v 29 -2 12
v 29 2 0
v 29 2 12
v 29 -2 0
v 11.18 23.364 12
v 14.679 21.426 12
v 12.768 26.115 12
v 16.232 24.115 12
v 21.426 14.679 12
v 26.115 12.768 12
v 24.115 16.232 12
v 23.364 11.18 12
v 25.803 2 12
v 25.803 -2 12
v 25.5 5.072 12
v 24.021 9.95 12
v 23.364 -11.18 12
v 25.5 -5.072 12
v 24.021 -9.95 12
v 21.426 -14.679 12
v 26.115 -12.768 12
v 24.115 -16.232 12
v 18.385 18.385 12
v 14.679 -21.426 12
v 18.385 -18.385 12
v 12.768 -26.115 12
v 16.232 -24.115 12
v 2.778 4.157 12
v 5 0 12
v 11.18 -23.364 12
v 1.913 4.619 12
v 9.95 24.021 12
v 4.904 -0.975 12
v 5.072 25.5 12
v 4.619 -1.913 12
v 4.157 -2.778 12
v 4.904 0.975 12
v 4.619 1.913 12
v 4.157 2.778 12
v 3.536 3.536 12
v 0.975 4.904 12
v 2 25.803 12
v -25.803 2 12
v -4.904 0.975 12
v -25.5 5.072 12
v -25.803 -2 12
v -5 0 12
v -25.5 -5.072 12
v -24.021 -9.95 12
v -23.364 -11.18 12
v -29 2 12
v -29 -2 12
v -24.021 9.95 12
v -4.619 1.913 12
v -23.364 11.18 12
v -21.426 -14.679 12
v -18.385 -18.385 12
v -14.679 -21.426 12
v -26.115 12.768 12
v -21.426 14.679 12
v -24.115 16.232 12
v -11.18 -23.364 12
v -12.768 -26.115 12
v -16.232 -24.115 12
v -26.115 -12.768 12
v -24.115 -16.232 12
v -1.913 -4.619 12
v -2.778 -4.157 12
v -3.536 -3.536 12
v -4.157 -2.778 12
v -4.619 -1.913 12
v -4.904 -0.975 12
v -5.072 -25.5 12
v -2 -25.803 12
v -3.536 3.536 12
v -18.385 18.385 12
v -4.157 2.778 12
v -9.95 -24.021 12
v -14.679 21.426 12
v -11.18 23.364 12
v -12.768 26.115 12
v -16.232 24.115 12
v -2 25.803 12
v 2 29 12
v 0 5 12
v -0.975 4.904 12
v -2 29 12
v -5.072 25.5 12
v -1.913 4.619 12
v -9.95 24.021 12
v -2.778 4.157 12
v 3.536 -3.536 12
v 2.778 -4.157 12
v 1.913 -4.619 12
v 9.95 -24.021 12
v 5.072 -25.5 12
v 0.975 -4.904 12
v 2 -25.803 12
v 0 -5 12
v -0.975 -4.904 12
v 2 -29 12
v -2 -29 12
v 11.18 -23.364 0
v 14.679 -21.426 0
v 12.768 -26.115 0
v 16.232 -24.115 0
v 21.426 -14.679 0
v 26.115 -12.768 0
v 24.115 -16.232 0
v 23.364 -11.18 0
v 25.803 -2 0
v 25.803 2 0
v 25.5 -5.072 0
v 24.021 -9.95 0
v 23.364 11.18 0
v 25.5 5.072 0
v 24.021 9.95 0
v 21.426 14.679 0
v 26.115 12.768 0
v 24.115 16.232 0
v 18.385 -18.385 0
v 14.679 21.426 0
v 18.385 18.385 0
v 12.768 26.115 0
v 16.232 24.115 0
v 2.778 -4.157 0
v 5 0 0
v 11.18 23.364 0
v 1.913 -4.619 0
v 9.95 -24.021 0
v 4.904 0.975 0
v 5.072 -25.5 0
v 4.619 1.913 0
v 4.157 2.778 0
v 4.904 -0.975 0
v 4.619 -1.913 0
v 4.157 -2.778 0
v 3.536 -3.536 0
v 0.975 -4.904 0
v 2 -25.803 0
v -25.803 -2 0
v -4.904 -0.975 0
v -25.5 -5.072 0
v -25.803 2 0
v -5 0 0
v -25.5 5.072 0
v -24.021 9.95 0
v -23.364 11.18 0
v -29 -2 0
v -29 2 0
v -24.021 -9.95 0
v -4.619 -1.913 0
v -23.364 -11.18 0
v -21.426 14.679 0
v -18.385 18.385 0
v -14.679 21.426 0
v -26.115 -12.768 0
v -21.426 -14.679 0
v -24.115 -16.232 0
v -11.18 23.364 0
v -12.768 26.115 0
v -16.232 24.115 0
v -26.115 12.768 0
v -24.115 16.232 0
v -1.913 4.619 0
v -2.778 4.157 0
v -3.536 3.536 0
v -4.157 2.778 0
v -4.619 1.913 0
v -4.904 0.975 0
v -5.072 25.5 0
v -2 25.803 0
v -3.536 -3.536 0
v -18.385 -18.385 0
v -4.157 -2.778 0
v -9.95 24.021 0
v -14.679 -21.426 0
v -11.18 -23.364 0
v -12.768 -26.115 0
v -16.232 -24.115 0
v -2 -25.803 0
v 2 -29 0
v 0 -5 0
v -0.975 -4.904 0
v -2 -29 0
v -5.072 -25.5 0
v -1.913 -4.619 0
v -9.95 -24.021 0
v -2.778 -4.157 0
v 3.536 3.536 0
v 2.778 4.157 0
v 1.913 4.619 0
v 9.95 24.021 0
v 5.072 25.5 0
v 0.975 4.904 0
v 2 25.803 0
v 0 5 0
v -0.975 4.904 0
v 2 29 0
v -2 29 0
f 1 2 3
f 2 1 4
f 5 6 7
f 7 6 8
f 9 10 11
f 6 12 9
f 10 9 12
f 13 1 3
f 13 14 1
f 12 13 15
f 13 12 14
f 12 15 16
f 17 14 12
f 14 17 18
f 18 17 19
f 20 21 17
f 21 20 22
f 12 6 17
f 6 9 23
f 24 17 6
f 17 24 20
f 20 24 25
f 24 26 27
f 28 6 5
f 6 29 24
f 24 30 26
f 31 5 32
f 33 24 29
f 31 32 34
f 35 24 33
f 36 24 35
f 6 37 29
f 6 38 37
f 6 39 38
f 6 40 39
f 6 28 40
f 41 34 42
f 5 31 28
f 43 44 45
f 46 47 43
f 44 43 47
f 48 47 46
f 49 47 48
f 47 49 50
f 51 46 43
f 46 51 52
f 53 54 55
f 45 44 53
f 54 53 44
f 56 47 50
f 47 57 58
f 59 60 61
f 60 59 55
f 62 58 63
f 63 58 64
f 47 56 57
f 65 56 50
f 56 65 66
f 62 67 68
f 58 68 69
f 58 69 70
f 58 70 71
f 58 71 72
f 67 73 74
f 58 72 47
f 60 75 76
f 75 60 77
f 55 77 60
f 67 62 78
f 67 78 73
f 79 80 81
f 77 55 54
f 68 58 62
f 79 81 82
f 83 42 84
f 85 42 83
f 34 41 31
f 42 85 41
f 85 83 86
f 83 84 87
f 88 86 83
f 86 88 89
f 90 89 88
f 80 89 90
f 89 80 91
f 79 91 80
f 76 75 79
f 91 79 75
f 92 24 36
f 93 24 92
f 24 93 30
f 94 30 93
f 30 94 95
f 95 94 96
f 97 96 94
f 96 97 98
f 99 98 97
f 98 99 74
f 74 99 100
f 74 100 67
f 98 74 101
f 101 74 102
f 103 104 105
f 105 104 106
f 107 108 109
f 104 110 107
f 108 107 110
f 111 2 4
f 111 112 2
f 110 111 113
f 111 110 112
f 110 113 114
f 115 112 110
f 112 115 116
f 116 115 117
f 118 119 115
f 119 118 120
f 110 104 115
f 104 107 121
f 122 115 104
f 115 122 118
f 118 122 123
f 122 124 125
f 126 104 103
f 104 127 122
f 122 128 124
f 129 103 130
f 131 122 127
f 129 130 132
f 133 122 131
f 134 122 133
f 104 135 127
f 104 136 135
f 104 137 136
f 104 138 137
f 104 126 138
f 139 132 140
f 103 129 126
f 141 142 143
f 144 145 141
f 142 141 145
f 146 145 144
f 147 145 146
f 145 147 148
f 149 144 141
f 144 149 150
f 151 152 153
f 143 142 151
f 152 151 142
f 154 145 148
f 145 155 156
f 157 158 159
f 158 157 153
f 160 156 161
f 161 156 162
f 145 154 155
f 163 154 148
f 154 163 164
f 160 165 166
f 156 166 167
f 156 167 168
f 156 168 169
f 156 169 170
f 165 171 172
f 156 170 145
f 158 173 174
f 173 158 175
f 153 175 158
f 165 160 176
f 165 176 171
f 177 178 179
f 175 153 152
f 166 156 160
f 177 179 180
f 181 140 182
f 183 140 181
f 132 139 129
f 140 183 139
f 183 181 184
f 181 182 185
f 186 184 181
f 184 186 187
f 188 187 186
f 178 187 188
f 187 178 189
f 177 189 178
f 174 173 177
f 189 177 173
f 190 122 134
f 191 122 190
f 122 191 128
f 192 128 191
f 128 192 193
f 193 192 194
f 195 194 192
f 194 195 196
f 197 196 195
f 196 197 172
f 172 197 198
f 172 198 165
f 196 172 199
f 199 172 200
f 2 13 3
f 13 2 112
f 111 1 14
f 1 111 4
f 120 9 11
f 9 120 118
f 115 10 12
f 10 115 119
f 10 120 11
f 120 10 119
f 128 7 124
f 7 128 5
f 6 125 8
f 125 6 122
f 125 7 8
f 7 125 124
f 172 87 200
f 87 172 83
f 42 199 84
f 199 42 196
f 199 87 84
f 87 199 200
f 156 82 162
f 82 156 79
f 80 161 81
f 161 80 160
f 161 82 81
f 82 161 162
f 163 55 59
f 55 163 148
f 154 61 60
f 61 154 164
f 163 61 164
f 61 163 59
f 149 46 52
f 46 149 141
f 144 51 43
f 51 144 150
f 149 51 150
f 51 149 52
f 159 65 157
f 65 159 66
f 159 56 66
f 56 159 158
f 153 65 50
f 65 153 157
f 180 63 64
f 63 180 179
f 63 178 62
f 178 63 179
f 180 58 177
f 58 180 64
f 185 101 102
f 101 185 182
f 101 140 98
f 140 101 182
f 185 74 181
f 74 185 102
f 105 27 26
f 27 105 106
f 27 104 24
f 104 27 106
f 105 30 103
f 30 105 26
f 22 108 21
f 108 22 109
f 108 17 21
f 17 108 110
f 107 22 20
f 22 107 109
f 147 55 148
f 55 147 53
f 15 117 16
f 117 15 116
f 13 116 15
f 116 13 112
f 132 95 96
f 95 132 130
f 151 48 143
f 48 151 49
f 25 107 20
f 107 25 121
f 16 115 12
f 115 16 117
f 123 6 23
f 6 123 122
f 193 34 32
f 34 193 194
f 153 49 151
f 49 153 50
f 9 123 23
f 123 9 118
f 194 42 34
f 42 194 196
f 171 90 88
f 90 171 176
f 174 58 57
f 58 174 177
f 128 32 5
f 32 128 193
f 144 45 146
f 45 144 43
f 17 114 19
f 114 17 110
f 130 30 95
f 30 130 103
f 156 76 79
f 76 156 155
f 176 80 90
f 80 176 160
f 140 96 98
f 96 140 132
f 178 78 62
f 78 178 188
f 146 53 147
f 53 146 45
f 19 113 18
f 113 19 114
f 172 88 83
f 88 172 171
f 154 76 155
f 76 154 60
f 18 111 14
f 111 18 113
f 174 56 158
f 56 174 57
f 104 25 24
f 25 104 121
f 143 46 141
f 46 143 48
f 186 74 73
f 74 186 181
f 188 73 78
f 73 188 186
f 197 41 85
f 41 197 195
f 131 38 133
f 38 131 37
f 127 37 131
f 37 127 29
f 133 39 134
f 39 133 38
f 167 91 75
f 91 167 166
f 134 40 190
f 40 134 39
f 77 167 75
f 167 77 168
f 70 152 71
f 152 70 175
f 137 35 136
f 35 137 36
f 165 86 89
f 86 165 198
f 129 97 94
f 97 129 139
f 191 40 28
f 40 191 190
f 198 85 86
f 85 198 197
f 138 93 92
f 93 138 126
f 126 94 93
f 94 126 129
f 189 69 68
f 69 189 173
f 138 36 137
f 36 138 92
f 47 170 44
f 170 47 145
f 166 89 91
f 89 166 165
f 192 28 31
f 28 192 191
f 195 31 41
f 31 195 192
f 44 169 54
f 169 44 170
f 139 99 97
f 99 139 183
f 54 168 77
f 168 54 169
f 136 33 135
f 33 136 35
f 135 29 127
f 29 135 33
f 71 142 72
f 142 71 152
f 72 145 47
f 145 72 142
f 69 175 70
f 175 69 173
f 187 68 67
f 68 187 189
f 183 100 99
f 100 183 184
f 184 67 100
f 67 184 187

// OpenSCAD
$fn = 32;

// ----------------------------------------------------------------------
// Spur blank: bored gear blank
// ----------------------------------------------------------------------

// --- parameters (mm) ---
disc_r = 26;              // blank root radius
disc_t = 12;              // blank thickness
n_teeth = 12;             // stub tooth count
tooth_w = 4;              // tooth width at the root
tooth_h = 3;              // tooth height above the root
bore_r = 5;               // central bore radius

out_r = disc_r + tooth_h;  // tip radius
bbox_x = 58.0;  // measured width over the teeth
bbox_y = 58.0;  // measured depth over the teeth

difference() {
union() {
  cylinder(r = disc_r, h = disc_t);
  for (i = [0 : n_teeth - 1])
    rotate([0, 0, i * 360 / n_teeth])
      translate([disc_r - 1, -tooth_w / 2, 0])
        cube([tooth_h + 1, tooth_w, disc_t]);
}
  translate([0, 0, -1]) cylinder(r = bore_r, h = disc_t + 2);
}
